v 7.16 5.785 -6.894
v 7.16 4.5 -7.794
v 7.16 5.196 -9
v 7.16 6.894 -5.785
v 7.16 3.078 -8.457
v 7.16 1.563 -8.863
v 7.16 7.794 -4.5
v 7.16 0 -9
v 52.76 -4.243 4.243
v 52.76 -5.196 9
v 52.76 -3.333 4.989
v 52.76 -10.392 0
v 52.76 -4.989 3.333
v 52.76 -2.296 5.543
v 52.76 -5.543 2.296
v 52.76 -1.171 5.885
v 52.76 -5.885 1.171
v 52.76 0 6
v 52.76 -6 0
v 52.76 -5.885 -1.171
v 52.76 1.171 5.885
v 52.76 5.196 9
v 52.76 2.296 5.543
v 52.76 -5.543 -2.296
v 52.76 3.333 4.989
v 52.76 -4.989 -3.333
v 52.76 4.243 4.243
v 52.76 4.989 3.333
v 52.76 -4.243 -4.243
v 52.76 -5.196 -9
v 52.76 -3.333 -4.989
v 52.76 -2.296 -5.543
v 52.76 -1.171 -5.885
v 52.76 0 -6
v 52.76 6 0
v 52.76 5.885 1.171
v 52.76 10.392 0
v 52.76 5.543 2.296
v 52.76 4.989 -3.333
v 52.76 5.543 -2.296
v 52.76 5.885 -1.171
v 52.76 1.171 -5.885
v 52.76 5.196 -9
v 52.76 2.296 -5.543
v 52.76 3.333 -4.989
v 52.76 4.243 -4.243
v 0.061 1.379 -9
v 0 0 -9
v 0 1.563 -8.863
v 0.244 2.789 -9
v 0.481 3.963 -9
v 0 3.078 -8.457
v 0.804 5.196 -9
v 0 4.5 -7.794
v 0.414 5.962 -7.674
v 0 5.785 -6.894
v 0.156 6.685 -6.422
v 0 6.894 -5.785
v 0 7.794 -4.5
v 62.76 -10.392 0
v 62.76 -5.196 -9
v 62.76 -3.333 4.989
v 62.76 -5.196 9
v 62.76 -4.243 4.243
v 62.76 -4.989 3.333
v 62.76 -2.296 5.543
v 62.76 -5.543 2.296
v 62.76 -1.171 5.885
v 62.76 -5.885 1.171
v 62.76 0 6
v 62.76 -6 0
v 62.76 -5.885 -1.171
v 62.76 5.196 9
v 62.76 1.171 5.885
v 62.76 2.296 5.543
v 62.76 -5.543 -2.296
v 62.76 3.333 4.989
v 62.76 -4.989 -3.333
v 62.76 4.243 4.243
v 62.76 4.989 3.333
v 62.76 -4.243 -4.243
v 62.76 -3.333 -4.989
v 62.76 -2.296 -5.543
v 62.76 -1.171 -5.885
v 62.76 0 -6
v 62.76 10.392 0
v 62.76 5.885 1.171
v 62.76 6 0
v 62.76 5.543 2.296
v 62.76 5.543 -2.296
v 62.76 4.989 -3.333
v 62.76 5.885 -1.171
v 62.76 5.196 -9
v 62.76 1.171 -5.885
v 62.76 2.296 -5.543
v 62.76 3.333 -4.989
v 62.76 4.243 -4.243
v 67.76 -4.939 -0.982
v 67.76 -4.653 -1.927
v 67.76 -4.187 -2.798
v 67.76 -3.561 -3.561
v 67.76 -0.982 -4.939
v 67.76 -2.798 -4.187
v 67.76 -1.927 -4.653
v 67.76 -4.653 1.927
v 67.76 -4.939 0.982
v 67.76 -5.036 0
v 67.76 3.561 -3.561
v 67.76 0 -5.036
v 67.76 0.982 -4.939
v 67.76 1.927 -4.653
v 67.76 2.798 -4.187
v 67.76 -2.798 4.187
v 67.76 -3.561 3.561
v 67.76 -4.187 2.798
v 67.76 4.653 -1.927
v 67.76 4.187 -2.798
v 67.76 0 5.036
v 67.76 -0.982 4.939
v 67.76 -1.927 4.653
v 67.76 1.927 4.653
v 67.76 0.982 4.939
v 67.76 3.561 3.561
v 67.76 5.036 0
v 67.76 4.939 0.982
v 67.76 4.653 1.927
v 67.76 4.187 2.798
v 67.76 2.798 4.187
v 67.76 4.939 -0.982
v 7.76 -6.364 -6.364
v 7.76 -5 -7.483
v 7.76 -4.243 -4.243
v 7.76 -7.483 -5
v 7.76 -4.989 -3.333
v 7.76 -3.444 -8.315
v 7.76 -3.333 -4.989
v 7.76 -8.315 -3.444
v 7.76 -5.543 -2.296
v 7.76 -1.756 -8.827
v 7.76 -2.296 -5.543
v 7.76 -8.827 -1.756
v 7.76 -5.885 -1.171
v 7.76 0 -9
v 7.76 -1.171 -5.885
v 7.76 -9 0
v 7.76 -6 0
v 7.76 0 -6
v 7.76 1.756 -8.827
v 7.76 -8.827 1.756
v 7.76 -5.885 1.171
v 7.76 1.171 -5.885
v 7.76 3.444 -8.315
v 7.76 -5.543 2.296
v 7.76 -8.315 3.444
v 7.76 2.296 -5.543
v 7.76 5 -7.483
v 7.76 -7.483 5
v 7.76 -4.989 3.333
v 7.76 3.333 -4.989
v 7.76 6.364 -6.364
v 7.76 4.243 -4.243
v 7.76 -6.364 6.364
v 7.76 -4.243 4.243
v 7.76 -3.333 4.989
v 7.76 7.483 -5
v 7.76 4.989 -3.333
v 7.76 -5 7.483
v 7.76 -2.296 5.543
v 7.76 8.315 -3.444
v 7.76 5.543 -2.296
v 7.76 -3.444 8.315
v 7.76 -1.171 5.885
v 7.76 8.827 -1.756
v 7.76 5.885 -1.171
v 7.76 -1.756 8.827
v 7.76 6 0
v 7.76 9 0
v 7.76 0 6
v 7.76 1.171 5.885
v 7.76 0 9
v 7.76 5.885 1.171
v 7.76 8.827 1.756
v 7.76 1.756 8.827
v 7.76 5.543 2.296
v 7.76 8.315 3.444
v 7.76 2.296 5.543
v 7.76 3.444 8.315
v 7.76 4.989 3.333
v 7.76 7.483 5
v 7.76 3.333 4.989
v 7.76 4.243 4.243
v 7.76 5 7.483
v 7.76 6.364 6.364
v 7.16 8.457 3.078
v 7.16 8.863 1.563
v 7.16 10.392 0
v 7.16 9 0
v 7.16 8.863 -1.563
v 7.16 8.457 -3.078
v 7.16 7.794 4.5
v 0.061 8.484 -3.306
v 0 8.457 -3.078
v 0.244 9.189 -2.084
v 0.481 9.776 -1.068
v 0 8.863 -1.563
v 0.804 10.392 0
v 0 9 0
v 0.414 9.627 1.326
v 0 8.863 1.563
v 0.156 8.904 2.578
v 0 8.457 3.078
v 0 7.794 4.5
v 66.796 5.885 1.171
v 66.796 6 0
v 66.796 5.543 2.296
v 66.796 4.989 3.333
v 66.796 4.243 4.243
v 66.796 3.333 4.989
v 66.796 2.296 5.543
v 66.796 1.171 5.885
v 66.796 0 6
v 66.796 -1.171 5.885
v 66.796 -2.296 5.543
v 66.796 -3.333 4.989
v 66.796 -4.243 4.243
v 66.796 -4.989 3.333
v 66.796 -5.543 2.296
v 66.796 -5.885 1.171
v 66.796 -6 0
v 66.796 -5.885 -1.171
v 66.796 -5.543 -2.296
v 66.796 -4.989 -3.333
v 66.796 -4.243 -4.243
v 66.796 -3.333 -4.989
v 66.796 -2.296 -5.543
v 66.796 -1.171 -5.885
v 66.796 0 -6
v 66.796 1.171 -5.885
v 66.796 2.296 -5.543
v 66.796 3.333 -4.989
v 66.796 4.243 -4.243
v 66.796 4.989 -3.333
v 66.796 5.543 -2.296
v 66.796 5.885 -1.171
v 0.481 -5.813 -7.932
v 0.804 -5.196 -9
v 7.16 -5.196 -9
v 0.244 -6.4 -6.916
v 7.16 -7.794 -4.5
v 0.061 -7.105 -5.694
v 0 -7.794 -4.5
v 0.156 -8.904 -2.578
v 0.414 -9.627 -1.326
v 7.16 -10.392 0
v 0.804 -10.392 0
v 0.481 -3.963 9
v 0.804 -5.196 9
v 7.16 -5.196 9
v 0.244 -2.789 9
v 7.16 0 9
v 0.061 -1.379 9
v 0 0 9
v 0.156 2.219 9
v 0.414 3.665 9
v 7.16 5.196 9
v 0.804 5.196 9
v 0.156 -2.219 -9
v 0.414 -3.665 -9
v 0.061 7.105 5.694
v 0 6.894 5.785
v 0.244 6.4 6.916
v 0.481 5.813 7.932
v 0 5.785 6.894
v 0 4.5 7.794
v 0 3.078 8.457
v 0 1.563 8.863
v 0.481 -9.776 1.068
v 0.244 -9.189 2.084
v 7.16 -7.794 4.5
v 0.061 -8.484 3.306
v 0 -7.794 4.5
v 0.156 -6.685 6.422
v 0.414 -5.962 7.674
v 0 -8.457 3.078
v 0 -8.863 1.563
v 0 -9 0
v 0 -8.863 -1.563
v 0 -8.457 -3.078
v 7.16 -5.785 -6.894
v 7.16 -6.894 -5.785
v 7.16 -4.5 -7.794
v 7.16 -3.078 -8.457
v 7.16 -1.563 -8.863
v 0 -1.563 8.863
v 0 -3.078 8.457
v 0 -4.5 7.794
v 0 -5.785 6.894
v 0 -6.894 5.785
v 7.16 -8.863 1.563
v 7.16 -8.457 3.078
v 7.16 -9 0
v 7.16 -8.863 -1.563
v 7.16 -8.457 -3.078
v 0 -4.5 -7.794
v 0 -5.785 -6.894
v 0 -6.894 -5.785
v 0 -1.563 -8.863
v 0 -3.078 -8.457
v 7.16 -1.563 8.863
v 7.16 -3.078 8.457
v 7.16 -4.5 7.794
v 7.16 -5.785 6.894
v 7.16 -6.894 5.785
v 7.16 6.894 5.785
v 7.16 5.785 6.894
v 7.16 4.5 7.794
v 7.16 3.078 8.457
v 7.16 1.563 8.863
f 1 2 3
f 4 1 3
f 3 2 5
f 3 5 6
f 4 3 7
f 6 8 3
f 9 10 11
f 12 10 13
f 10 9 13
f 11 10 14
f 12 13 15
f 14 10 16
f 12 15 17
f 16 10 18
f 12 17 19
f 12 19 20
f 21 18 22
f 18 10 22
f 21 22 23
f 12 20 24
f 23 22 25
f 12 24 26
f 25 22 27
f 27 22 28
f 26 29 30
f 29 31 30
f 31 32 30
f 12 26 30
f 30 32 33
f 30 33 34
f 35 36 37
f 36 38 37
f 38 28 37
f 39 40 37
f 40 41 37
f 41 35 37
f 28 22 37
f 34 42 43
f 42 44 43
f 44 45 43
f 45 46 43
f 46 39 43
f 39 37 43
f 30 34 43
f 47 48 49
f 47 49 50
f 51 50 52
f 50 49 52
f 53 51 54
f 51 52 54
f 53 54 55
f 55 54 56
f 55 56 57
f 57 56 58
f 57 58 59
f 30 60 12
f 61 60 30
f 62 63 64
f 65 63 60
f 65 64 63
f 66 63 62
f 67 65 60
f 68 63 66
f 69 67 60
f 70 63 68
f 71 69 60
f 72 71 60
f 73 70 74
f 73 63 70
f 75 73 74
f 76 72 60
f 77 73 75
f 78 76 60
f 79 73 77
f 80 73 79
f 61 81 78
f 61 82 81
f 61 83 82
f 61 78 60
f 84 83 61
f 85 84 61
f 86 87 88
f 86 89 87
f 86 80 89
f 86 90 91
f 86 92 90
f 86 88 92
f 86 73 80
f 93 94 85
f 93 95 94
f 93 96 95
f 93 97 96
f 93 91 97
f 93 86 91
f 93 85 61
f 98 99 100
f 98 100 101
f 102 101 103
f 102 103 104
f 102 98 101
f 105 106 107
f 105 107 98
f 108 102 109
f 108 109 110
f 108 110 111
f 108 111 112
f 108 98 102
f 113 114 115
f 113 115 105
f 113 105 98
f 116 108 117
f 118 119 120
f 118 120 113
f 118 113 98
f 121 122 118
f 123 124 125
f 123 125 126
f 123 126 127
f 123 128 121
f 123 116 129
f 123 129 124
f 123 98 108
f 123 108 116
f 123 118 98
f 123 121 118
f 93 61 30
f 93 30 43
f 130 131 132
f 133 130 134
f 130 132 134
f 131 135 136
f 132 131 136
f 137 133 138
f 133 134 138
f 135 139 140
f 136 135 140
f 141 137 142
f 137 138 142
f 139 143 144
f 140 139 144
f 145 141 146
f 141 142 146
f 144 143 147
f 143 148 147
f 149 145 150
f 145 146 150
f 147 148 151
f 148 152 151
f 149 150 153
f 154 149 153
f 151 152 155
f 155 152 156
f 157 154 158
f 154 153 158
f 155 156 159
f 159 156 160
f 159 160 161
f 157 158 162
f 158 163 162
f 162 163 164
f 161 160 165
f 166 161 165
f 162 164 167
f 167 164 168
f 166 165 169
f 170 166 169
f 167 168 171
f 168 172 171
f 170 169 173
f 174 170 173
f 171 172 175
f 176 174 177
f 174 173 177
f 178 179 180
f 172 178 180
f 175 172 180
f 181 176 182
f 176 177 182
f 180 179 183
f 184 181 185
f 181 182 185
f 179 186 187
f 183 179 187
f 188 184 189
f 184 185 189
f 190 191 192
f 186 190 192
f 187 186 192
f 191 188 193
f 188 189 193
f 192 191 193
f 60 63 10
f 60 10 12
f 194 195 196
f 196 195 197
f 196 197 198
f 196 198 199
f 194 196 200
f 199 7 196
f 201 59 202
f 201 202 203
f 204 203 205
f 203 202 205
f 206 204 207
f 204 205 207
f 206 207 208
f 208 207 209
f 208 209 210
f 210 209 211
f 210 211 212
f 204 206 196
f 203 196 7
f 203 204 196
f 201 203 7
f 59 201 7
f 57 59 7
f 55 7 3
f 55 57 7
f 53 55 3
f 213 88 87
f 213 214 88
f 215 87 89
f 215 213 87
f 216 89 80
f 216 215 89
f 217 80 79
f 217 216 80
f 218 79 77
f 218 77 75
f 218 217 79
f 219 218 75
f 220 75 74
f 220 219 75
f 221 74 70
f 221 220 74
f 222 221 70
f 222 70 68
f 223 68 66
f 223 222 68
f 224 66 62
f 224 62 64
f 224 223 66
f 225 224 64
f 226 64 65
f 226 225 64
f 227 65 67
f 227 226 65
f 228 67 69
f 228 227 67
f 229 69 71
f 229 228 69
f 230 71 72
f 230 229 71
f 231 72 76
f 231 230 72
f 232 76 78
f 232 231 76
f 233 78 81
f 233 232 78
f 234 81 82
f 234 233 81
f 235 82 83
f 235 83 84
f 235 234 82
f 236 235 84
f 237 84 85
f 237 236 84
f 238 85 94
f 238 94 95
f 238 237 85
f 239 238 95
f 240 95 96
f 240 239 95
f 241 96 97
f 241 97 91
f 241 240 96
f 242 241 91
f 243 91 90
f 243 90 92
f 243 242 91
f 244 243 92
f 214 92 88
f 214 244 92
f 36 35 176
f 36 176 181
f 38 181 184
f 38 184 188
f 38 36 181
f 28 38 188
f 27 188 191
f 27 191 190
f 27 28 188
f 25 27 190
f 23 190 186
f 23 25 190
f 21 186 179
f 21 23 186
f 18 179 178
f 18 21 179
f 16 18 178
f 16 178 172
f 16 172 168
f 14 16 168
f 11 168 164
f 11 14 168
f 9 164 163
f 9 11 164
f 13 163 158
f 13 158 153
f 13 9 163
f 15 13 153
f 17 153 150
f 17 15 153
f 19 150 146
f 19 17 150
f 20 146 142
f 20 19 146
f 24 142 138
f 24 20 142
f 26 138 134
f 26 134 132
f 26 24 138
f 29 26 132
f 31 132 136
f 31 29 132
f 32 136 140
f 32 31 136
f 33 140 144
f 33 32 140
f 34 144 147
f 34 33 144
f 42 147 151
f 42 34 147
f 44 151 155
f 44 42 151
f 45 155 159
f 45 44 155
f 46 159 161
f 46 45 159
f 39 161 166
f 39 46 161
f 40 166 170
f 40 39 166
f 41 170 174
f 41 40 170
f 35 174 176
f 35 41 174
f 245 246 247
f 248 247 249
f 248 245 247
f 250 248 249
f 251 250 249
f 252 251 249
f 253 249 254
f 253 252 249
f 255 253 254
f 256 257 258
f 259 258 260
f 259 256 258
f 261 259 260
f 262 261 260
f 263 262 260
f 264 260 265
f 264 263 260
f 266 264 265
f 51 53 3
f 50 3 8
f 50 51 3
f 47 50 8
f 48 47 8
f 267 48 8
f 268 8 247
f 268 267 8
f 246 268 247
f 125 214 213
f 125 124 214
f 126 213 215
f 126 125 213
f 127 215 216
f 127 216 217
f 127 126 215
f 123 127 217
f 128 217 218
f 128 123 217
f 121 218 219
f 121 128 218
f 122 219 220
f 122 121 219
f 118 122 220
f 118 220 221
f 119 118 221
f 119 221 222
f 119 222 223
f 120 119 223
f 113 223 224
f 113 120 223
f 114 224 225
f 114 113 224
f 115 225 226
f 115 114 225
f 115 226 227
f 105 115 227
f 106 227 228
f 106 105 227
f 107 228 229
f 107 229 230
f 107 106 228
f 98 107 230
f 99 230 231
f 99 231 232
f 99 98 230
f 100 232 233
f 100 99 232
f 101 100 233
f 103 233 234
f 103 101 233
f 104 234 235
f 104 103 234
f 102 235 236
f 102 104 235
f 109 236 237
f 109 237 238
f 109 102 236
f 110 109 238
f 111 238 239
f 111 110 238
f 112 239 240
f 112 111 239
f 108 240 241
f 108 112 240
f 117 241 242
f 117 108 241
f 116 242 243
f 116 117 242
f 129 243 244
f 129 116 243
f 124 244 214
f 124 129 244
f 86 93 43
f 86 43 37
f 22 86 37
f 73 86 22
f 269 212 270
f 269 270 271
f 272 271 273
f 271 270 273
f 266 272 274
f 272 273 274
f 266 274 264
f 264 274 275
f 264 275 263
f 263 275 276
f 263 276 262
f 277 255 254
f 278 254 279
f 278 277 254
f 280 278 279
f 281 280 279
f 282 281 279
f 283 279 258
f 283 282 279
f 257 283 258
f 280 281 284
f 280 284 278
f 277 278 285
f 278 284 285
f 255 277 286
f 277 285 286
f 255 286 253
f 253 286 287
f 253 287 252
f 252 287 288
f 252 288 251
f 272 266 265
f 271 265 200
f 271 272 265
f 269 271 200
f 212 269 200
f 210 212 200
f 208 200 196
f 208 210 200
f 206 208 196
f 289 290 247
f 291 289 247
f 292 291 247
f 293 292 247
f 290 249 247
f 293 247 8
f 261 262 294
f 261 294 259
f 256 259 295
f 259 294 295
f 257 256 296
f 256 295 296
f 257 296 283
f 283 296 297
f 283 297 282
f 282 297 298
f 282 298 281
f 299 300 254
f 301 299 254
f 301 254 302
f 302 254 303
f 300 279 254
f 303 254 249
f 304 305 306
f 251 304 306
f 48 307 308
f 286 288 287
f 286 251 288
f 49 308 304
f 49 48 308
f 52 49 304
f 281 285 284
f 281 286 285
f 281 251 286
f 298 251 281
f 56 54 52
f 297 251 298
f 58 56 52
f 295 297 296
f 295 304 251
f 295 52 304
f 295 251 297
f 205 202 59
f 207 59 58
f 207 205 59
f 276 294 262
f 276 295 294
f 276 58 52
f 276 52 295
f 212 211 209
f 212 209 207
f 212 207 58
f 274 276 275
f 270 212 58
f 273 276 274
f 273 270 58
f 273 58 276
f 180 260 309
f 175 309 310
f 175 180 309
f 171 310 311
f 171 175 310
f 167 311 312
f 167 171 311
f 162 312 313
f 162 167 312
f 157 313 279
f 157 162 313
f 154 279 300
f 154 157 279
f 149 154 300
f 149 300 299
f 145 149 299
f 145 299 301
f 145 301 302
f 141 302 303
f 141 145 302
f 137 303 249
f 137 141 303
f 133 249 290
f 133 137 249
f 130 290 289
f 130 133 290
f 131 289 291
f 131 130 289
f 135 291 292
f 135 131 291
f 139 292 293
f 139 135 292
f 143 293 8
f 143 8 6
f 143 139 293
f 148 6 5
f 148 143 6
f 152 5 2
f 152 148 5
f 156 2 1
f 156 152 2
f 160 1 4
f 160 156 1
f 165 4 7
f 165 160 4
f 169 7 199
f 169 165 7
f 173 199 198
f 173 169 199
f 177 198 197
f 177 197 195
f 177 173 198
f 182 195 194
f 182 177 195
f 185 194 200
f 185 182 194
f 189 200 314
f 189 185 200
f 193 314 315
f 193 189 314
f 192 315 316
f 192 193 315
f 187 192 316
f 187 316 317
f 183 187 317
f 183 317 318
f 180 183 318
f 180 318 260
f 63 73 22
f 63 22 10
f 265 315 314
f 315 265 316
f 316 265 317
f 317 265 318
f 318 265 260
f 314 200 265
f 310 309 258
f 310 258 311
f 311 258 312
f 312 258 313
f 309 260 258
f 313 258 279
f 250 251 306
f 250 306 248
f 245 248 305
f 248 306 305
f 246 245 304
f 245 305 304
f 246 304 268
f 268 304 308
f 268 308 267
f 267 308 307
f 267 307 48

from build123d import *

# Parameters (mm, degrees)
BASEHEAD_DEPTH      = 7.76
SKETCH4_W           = 0.6
SKETCH4_H           = 11.392304845
BOSS_EXTRUDE1_DEPTH = 10


# Read off the part's stored shape, not the designer's step: HeadChamfer
with BuildPart() as part:
    # Sketch1 → BaseHead (new body)
    with BuildSketch(Plane(origin=(0, 0, 0), x_dir=(0, 0, -1), z_dir=(1, 0, 0))):
        Polygon((9, 5.196152423), (9, -5.196152423), (0, -10.392304845), (-9, -5.196152423), (-9, 5.196152423), (0, 10.392304845), align=None)
    extrude(amount=BASEHEAD_DEPTH)

    # HeadChamfer outline → HeadChamfer (revolve, cut)
    with BuildSketch(Plane.YX):
        Polygon((10.392304847, 0.803847578), (9, 0), (10.392304847, 0), align=None)
    revolve(axis=Axis((0, 0, 0), (1, 0, 0)), mode=Mode.SUBTRACT)

    # HeadChamfer 2 outline → HeadChamfer 2 (revolve)
    with BuildSketch(Plane.YX):
        Polygon((6, 7.76), (6, 66.796), (5.036, 67.76), (0, 67.76), (0, 7.76), align=None)
    revolve(axis=Axis((0, 0, 0), (1, 0, 0)))

    # Sketch4 → BearingFace (revolve, cut)
    with BuildSketch(Plane.XY, mode=Mode.PRIVATE) as bearingface_sk:
        with Locations((7.46, 14.696152423)):
            Rectangle(SKETCH4_W, SKETCH4_H)
    revolve(bearingface_sk.sketch.rotate(Axis((0, 0, 0), (1, 0, 0)), 90), axis=Axis((0, 0, 0), (1, 0, 0)), mode=Mode.SUBTRACT)

    # Sketch5 → Boss-Extrude1 (add)
    with BuildSketch(Plane(origin=(62.76, 0, 0), x_dir=(0, 0, -1), z_dir=(1, 0, 0))):
        Polygon((0, 10.392304845), (-9, 5.196152423), (-9, -5.196152423), (0, -10.392304845), (9, -5.196152423), (9, 5.196152423), align=None)
    extrude(amount=-BOSS_EXTRUDE1_DEPTH)


solid = part.part
